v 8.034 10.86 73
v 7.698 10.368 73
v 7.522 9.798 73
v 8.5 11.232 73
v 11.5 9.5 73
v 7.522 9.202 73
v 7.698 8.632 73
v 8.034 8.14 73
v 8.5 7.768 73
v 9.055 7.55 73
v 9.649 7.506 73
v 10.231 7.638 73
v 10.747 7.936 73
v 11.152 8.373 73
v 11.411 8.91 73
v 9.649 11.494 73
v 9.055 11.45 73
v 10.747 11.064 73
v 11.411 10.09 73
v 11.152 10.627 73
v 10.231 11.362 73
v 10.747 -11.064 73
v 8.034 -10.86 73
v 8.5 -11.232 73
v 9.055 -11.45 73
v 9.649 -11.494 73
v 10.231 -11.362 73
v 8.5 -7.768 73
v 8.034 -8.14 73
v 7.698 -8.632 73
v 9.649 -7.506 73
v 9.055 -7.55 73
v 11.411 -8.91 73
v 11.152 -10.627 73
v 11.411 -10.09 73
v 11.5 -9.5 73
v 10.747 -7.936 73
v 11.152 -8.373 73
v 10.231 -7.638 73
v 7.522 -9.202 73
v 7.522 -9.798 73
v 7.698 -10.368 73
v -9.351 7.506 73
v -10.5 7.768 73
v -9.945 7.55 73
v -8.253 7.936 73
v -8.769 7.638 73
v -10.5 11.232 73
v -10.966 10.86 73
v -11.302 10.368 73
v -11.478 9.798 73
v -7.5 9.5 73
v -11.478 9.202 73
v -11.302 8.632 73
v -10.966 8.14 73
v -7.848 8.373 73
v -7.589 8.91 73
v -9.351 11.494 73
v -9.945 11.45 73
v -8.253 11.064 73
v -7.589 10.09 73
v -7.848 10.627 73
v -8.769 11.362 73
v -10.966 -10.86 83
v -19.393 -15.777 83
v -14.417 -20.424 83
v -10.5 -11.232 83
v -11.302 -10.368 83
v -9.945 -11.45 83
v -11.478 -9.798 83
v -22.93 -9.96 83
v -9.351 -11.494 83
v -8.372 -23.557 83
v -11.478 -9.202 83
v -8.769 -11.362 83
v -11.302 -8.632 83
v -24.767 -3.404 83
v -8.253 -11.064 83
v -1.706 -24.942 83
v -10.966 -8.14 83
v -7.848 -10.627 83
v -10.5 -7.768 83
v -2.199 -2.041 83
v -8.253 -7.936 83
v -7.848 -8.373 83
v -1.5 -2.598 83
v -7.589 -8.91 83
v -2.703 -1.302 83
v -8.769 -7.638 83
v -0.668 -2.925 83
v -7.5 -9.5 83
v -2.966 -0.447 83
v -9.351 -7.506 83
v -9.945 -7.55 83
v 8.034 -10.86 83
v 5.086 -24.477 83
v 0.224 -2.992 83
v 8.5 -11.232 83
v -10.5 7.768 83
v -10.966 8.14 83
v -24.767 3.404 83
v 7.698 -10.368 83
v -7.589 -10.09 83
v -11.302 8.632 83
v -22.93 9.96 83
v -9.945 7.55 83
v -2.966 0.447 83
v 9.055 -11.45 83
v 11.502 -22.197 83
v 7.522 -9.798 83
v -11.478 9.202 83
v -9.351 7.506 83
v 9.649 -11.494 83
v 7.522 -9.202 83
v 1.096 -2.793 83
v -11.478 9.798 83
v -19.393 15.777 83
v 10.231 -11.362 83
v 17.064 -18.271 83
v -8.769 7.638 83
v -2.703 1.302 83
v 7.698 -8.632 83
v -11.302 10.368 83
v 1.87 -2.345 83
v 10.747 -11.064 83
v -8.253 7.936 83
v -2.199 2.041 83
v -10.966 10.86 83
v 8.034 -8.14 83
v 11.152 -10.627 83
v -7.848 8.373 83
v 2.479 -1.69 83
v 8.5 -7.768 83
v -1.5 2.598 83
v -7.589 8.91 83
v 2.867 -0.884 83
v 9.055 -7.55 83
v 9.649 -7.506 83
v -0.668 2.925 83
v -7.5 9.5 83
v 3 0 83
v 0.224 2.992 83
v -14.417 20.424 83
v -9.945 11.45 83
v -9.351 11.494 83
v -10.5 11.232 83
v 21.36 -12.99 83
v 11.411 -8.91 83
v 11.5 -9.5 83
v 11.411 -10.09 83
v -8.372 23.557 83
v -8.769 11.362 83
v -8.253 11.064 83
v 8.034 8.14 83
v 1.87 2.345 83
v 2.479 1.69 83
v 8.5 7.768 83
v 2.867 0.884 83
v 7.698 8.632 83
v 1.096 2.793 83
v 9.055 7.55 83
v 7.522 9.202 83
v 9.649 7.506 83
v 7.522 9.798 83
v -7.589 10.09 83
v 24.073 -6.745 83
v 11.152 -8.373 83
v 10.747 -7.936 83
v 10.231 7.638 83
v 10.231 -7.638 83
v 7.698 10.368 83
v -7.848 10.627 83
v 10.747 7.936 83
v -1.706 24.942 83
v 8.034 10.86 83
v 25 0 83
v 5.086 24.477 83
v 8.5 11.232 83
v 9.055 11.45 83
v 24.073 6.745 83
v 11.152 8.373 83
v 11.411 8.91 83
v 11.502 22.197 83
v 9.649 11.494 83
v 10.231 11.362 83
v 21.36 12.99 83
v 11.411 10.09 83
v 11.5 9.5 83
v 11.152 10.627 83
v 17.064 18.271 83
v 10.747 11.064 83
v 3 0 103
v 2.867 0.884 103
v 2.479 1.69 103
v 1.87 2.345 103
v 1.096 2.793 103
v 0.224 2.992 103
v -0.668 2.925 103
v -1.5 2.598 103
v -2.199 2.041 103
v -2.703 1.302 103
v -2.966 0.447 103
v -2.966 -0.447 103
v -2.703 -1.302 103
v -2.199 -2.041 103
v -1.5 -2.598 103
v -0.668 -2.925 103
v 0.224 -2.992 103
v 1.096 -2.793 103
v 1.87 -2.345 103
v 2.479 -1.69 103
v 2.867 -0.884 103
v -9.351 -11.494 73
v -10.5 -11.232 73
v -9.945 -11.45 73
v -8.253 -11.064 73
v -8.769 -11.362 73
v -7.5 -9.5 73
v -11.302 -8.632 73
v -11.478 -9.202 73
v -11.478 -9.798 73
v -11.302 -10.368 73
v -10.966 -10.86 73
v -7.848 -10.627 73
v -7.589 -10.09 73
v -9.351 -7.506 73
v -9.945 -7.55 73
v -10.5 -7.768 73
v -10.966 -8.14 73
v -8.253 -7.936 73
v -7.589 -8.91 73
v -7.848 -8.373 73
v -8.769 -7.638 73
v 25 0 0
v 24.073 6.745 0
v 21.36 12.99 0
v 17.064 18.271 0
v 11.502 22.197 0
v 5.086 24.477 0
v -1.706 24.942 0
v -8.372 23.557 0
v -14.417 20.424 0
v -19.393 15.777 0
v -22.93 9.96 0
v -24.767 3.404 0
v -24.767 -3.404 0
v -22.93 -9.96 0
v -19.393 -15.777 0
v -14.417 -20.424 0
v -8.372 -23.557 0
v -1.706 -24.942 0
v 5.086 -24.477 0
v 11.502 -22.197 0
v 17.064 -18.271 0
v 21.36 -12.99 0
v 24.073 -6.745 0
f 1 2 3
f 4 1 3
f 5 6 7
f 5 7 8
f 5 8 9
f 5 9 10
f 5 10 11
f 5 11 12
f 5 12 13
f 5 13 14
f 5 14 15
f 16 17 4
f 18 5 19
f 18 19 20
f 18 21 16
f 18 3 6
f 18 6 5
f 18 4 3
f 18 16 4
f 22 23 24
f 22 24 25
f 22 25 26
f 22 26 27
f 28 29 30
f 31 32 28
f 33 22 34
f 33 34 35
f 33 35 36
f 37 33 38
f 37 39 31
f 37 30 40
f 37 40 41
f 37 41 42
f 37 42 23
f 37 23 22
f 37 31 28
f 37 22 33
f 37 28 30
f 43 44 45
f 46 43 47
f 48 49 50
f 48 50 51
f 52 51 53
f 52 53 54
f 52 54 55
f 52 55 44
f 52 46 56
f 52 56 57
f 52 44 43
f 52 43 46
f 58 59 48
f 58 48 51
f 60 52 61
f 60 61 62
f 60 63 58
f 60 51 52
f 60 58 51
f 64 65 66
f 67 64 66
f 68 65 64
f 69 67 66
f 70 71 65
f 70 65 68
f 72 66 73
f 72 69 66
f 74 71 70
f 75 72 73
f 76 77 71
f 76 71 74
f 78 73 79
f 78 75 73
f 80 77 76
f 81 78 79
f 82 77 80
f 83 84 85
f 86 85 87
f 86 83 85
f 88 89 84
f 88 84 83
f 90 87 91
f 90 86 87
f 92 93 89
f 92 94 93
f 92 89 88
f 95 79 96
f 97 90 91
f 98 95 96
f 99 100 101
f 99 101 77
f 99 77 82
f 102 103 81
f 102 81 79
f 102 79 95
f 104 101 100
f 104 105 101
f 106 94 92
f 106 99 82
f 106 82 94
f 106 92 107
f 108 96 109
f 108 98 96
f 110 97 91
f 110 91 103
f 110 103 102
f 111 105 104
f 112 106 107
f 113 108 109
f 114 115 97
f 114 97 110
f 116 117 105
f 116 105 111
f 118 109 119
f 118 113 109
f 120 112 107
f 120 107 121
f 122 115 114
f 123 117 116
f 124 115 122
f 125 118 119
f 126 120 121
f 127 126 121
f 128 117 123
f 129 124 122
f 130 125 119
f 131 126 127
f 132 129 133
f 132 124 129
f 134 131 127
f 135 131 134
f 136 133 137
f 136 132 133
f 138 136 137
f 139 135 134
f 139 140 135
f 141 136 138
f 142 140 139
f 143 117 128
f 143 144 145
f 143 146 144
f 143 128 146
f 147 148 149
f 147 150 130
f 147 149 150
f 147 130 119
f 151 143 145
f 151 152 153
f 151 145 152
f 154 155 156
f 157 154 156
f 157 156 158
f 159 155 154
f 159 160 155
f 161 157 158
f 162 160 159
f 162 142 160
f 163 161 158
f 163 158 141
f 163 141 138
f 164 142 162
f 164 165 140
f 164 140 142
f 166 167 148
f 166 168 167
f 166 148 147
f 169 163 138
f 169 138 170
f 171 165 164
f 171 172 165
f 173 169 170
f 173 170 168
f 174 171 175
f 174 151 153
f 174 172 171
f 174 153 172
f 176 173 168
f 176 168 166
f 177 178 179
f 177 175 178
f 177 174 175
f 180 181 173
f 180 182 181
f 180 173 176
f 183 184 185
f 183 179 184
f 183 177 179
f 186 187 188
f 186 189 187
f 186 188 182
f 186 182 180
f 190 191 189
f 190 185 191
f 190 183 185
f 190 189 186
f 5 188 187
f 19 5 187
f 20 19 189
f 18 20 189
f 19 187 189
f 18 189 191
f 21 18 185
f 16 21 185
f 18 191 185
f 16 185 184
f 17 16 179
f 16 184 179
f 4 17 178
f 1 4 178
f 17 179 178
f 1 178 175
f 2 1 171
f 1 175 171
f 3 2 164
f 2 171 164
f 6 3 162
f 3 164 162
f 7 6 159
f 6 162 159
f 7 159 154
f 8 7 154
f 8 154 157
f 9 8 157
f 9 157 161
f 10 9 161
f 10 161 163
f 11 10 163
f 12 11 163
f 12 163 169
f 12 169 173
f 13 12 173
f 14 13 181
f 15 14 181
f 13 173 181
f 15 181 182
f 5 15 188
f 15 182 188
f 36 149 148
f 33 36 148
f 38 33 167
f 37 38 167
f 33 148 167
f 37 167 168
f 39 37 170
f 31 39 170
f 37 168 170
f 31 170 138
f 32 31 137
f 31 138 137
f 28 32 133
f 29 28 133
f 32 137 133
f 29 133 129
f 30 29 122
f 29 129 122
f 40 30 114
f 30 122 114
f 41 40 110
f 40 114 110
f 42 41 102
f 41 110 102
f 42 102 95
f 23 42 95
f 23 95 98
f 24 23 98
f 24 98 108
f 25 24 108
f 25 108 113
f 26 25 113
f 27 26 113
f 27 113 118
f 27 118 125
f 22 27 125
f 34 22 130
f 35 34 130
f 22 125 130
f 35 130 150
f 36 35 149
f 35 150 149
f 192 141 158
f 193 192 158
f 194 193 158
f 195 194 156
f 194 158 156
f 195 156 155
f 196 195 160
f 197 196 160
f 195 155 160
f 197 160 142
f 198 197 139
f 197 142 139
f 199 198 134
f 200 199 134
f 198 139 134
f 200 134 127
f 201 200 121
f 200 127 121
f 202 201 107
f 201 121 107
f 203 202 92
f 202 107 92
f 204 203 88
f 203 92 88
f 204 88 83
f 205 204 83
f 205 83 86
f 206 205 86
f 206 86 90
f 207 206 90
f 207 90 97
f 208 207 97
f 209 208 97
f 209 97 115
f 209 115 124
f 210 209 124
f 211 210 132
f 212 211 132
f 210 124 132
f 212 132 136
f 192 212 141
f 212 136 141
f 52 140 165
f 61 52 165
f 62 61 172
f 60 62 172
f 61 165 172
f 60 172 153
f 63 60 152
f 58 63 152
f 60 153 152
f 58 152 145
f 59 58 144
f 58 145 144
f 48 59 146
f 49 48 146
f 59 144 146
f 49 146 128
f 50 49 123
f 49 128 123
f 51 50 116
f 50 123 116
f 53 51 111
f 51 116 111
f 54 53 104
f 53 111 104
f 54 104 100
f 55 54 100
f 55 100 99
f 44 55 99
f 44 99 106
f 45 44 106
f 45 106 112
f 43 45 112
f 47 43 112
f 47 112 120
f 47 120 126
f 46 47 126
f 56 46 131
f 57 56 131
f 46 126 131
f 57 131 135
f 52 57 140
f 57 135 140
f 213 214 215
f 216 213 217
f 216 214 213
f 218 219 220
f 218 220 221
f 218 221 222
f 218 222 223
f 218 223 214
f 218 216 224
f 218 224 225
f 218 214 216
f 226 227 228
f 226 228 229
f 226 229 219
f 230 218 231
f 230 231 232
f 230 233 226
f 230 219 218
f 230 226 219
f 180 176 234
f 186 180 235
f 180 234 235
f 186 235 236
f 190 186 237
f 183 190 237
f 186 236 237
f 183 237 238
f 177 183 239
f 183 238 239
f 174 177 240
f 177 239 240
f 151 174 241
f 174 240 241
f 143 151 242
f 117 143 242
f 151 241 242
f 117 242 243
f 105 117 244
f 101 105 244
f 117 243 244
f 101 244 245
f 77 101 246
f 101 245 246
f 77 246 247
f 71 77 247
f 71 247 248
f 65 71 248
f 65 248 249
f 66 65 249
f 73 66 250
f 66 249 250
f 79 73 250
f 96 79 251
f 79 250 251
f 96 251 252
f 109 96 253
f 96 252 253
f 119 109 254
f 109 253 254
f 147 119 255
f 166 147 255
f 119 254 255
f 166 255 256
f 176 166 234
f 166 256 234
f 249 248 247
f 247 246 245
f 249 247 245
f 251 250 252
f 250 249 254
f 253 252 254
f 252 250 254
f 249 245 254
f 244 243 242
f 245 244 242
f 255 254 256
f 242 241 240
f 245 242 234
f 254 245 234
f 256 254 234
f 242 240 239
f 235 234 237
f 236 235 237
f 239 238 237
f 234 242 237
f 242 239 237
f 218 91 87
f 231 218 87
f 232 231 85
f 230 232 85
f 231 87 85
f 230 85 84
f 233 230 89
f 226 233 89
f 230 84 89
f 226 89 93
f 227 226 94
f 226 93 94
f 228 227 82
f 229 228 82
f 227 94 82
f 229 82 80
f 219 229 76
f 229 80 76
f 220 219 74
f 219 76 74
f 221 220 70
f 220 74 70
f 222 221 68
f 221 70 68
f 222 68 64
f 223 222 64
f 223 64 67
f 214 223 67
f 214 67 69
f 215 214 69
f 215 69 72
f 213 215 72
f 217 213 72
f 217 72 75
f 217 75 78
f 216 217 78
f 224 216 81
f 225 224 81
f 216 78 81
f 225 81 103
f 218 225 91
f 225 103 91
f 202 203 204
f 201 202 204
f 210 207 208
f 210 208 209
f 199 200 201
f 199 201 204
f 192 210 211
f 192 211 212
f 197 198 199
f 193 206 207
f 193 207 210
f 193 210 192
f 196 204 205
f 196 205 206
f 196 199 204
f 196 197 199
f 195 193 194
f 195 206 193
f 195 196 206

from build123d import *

# Parameters (mm, degrees)
SKETCH1_R           = 25
BOSS_EXTRUDE1_DEPTH = 83
SKETCH2_R           = 3
BOSS_EXTRUDE2_DEPTH = 20
SKETCH3_R           = 2
CUT_EXTRUDE1_DEPTH  = 10


with BuildPart() as part:
    # Sketch1 → Boss-Extrude1 (new body)
    with BuildSketch(Plane.XY):
        Circle(SKETCH1_R)
    extrude(amount=BOSS_EXTRUDE1_DEPTH)

    # Sketch2 → Boss-Extrude2 (add)
    with BuildSketch(Plane.XY.offset(83)):
        Circle(SKETCH2_R)
    extrude(amount=BOSS_EXTRUDE2_DEPTH)

    # Sketch3 → Cut-Extrude1 (cut)
    with BuildSketch(Plane.XY.offset(83)):
        with Locations((-9.5, 9.5)):
            Circle(SKETCH3_R)
        with Locations((-9.5, -9.5)):
            Circle(SKETCH3_R)
        with Locations((9.5, -9.5)):
            Circle(SKETCH3_R)
        with Locations((9.5, 9.5)):
            Circle(SKETCH3_R)
    extrude(amount=-CUT_EXTRUDE1_DEPTH, mode=Mode.SUBTRACT)


solid = part.part
